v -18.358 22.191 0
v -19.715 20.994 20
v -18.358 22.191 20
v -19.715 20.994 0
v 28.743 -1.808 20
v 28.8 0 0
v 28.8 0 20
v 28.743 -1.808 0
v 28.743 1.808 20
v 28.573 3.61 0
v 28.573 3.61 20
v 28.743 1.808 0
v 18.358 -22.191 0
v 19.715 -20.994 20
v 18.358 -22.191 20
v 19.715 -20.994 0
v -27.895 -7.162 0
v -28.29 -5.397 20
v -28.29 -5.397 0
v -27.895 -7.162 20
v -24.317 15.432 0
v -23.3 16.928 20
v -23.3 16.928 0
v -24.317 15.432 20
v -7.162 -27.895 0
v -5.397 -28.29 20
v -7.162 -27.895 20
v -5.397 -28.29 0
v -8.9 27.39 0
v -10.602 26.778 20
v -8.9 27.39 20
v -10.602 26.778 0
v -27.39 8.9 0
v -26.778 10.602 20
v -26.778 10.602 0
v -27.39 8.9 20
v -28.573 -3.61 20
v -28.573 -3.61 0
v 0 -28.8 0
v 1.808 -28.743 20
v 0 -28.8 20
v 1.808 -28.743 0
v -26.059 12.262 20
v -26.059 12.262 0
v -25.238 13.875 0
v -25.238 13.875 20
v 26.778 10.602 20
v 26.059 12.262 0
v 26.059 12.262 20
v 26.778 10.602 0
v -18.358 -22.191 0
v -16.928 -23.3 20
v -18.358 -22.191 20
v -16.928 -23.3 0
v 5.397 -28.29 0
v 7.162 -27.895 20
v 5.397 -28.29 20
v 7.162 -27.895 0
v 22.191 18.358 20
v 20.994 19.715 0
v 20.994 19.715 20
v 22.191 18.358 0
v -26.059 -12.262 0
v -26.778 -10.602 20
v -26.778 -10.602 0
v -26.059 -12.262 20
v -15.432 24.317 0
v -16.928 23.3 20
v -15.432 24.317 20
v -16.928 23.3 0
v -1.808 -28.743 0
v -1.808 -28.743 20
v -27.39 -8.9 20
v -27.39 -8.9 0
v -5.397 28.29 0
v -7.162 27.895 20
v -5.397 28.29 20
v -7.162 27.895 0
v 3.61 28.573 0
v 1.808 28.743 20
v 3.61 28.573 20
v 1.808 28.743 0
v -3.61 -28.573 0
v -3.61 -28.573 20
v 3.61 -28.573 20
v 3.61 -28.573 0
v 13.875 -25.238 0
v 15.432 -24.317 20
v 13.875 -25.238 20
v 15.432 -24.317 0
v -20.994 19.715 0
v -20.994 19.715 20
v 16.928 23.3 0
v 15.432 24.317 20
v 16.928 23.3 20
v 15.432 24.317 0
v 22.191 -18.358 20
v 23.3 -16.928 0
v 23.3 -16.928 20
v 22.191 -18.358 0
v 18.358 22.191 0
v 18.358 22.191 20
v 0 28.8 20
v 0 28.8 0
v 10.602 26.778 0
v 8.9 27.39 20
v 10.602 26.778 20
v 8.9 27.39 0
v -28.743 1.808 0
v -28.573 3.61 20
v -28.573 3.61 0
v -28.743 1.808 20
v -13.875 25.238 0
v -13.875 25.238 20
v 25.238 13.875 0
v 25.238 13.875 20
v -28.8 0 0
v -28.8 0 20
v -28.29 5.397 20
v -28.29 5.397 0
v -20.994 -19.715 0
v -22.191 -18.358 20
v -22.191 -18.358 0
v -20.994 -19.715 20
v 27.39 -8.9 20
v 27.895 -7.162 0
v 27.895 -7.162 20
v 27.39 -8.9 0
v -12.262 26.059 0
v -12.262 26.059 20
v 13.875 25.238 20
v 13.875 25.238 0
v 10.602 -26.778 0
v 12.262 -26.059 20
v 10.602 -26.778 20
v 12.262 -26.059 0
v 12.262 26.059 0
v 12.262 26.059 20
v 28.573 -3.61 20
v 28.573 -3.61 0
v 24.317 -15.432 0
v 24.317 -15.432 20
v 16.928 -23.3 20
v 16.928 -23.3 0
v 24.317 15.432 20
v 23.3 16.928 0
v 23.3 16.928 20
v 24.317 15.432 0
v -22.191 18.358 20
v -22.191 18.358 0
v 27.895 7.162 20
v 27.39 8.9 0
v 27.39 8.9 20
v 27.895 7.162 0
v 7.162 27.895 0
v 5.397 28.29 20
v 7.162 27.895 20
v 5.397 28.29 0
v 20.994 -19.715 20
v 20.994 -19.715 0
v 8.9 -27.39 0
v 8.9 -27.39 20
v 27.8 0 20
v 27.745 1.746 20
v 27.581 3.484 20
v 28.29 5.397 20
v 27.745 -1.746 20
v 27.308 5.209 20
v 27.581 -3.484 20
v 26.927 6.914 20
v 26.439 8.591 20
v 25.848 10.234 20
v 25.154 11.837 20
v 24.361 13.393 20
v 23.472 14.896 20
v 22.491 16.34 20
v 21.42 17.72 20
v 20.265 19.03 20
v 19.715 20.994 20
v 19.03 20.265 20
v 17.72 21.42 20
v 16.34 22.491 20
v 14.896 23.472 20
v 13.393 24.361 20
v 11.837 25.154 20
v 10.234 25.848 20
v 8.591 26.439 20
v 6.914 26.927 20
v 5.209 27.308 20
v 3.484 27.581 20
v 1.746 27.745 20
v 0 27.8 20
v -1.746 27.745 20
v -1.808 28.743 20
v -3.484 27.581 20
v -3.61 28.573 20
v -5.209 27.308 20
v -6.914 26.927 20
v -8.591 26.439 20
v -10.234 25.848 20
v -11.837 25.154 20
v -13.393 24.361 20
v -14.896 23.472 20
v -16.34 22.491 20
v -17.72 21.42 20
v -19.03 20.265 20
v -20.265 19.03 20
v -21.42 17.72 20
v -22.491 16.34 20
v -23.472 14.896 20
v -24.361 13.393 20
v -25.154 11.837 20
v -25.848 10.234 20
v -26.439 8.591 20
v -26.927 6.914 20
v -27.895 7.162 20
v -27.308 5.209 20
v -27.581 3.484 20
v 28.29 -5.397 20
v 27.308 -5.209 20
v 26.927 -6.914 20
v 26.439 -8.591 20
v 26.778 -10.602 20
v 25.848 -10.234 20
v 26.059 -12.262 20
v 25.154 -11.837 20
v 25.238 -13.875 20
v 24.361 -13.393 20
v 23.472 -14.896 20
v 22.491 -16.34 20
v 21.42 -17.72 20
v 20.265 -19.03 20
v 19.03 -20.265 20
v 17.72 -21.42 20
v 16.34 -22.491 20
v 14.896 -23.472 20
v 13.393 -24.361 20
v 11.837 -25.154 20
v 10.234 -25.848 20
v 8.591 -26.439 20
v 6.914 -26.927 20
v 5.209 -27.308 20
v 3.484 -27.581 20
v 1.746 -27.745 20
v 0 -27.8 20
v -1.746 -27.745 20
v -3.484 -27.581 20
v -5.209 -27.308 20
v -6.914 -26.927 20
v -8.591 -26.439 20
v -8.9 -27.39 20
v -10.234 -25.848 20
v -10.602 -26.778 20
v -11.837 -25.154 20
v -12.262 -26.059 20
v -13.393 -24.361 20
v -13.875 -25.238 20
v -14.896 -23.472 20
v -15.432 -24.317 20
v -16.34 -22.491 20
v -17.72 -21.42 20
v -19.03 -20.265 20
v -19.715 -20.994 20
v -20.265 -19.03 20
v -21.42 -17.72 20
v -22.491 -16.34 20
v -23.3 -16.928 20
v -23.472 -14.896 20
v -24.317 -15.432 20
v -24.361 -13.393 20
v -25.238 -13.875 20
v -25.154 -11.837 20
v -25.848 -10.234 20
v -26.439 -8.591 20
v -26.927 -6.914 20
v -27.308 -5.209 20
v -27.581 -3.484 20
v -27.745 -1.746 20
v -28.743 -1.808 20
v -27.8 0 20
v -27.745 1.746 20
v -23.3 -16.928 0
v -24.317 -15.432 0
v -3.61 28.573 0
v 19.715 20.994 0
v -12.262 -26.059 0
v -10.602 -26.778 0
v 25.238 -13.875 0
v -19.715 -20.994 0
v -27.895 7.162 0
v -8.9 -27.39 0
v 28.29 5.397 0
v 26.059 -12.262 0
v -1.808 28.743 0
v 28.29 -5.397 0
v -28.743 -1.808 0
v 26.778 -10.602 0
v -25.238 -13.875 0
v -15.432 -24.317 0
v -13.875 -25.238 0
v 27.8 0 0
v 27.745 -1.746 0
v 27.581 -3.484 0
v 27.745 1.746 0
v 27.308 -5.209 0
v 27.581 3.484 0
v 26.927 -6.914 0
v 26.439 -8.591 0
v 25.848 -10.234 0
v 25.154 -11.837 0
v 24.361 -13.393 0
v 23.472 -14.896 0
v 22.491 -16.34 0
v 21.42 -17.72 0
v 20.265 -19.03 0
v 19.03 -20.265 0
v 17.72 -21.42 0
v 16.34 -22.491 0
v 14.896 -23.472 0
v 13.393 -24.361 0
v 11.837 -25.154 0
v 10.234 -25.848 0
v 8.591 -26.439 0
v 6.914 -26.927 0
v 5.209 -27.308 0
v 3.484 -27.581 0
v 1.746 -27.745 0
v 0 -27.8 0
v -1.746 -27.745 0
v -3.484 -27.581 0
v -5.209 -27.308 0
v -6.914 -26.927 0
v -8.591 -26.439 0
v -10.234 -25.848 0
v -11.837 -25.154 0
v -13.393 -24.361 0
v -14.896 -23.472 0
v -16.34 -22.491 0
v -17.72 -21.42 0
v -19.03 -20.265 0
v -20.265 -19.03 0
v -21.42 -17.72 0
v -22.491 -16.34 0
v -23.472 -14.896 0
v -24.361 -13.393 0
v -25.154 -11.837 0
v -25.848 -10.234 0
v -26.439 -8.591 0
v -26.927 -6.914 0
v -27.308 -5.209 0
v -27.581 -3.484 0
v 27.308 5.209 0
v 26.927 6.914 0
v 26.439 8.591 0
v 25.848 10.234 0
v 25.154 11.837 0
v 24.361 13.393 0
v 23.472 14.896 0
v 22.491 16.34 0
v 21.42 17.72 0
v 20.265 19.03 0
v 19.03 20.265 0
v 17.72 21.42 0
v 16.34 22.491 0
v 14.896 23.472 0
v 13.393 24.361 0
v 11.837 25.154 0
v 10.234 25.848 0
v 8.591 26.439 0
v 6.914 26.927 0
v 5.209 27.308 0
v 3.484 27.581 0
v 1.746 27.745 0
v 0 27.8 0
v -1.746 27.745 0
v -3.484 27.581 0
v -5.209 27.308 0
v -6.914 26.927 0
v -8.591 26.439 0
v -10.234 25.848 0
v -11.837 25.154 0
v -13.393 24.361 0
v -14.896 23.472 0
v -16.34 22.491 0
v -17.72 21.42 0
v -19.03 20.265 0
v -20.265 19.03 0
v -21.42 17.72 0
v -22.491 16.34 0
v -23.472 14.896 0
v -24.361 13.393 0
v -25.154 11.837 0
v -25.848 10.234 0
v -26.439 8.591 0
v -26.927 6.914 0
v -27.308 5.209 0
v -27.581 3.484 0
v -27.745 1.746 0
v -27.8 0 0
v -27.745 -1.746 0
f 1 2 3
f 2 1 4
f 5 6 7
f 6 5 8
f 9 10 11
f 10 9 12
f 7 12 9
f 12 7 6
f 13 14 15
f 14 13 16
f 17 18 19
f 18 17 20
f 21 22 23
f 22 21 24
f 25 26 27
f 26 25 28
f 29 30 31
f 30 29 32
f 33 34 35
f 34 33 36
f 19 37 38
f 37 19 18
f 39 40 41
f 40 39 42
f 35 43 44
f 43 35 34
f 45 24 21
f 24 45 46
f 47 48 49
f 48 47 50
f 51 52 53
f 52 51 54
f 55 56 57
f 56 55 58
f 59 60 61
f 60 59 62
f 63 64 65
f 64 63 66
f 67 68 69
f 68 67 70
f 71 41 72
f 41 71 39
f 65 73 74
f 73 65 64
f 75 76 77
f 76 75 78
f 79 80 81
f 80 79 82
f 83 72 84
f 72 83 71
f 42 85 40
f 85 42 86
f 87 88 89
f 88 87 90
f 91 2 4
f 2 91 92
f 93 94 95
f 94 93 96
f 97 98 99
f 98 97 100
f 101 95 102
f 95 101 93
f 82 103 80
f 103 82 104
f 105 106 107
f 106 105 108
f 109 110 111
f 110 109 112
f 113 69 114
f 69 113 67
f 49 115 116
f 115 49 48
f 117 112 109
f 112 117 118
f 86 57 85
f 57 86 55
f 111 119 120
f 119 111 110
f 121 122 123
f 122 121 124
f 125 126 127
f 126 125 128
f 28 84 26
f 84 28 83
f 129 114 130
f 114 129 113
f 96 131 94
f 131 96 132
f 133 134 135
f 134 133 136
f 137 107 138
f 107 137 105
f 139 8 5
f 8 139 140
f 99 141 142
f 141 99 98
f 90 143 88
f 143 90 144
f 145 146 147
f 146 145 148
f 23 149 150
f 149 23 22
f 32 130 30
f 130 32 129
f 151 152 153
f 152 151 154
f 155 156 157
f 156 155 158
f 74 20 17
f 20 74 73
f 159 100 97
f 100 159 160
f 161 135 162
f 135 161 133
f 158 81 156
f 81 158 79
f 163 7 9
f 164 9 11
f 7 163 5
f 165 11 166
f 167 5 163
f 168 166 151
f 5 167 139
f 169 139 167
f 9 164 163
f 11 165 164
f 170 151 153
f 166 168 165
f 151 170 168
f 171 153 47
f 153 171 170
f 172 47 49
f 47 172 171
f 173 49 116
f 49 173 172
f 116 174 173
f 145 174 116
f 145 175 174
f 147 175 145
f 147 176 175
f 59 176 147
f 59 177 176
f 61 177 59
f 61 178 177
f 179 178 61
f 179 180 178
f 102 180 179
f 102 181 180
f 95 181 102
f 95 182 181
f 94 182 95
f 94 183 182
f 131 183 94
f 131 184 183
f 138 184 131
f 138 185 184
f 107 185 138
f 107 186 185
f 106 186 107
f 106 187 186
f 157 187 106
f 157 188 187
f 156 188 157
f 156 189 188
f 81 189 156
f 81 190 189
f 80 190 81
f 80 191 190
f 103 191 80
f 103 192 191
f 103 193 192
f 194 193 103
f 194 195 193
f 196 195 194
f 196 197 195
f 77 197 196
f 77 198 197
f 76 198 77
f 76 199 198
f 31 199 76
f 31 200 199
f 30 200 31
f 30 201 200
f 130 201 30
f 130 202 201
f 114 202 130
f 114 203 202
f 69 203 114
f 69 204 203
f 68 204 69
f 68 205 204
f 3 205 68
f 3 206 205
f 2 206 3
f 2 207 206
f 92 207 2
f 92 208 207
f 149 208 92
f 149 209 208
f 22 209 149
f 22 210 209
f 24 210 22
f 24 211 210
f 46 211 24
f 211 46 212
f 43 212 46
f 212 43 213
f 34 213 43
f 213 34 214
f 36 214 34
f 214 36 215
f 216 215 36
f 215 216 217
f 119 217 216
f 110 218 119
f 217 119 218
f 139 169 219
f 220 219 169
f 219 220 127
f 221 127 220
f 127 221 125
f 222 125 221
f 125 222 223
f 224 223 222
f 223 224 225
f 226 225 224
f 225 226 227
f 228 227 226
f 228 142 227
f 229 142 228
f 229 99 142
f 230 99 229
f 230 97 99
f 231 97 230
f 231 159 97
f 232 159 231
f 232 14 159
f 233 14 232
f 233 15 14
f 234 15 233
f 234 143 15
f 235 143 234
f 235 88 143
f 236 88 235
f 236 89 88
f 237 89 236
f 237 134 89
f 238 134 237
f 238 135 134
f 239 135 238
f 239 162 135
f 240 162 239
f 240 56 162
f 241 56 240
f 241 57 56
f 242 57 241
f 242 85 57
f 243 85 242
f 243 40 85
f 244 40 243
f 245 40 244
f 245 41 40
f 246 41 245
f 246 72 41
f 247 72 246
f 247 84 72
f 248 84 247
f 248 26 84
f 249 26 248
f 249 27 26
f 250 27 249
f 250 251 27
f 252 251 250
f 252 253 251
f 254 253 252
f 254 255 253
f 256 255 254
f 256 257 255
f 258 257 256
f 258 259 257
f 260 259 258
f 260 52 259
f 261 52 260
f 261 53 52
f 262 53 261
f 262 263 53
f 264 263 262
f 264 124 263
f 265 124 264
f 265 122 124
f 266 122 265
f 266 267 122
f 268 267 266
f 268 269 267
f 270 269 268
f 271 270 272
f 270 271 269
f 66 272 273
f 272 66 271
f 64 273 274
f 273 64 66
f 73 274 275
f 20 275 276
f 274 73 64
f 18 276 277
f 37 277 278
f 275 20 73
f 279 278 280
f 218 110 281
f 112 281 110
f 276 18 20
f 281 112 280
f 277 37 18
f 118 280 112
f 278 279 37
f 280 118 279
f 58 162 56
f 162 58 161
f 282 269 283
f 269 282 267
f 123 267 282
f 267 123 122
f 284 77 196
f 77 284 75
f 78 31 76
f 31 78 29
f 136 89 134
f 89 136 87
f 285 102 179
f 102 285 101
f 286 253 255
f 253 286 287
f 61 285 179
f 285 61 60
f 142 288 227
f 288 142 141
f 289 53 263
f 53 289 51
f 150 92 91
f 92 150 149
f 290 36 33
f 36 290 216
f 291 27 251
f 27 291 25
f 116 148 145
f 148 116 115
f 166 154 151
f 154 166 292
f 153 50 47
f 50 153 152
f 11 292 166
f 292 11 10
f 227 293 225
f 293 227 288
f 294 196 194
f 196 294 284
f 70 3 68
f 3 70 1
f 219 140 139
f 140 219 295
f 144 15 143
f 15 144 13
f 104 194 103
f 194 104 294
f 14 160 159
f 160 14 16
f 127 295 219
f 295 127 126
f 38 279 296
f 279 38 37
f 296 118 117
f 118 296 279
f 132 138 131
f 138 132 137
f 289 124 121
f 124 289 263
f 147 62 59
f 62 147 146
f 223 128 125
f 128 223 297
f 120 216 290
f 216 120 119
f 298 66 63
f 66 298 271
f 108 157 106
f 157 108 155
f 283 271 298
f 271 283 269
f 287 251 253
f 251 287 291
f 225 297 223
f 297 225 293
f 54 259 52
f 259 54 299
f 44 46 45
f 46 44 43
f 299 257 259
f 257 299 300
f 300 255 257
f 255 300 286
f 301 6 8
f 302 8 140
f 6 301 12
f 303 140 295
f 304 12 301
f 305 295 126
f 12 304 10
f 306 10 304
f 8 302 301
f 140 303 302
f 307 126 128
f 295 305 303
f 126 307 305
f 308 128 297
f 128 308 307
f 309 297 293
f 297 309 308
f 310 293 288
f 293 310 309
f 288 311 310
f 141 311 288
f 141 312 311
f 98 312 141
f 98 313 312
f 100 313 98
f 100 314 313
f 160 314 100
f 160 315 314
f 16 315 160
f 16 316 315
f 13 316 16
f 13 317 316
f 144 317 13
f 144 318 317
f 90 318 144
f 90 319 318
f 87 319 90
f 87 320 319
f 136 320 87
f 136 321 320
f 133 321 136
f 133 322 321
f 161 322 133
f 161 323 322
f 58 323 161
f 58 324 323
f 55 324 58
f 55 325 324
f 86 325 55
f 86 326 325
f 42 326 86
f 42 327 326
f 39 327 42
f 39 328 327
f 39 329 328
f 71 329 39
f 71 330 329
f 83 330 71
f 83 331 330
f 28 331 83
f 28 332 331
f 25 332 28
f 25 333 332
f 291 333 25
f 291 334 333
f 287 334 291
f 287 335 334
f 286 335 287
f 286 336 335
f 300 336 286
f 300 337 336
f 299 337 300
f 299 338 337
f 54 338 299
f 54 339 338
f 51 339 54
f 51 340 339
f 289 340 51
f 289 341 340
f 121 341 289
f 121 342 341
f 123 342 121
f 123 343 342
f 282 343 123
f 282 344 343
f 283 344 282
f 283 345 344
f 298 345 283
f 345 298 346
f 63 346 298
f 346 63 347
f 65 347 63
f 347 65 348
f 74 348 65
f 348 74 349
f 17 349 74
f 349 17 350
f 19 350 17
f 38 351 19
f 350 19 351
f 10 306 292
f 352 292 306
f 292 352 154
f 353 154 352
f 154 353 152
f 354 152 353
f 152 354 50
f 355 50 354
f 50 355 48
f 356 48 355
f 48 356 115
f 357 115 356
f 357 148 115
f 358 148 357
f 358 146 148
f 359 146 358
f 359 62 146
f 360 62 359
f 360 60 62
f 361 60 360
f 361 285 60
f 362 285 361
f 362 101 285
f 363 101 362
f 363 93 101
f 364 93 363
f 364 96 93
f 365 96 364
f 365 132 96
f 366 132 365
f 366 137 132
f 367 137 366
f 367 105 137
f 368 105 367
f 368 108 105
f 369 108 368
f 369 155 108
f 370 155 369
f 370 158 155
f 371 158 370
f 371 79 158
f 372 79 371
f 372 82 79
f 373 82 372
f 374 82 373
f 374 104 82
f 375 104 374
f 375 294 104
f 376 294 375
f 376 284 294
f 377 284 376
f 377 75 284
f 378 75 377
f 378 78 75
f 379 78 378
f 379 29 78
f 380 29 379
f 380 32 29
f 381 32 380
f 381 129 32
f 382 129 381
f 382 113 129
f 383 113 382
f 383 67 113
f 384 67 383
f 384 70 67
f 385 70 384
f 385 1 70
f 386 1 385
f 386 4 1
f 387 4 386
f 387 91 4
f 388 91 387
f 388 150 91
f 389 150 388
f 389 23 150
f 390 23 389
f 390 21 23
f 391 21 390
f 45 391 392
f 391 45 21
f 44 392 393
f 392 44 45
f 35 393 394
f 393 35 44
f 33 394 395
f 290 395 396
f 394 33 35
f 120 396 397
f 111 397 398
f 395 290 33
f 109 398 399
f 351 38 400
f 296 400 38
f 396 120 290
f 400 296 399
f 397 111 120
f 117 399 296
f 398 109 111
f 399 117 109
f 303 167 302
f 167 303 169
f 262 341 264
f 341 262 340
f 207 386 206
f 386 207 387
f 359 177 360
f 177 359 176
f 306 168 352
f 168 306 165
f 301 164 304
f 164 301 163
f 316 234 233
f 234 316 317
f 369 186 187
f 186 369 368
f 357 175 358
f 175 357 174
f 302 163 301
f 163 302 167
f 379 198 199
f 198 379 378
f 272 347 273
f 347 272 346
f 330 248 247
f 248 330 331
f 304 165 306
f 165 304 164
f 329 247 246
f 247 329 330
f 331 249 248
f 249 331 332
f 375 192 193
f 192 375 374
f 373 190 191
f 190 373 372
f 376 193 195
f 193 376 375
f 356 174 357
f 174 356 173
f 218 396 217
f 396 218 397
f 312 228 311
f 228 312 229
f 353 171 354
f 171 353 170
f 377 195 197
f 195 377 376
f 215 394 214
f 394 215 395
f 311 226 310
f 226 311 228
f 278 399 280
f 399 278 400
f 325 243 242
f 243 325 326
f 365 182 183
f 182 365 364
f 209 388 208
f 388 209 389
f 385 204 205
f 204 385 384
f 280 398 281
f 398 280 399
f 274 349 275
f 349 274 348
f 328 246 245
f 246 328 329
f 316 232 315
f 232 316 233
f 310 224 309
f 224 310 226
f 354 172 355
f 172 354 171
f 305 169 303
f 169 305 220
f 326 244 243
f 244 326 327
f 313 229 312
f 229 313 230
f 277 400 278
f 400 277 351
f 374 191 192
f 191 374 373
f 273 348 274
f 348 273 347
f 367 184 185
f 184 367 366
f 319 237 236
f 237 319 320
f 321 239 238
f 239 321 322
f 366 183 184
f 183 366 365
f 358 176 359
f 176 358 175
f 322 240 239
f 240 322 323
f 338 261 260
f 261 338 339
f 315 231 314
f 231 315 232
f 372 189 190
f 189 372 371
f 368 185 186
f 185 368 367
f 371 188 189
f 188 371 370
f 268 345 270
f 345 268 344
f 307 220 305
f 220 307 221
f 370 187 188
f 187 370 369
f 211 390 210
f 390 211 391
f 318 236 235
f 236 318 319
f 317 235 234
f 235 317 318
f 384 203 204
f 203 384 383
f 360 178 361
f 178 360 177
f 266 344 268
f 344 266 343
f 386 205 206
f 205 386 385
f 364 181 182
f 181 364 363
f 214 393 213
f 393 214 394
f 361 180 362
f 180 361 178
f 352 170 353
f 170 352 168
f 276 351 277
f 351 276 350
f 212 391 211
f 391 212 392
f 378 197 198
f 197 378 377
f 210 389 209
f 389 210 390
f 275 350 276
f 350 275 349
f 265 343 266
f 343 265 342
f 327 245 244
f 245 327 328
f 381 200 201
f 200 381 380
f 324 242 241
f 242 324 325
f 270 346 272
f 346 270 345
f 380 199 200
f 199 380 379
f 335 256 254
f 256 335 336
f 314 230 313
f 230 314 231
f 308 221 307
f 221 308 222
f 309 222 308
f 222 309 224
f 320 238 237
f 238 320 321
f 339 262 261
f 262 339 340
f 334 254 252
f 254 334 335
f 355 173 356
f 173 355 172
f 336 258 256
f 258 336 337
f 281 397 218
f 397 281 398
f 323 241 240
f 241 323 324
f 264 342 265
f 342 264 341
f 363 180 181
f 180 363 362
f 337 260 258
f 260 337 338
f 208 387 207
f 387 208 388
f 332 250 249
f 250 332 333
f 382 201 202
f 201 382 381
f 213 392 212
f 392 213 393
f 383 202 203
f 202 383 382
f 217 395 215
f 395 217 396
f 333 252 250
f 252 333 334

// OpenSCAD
$fn = 100;
r_in = 25.6*(2.5-0.25)/2;
l = 20;
t = 1;

difference(){
	cylinder(h=l,r=r_in);
	cylinder(h=l,r=r_in-t);
}
